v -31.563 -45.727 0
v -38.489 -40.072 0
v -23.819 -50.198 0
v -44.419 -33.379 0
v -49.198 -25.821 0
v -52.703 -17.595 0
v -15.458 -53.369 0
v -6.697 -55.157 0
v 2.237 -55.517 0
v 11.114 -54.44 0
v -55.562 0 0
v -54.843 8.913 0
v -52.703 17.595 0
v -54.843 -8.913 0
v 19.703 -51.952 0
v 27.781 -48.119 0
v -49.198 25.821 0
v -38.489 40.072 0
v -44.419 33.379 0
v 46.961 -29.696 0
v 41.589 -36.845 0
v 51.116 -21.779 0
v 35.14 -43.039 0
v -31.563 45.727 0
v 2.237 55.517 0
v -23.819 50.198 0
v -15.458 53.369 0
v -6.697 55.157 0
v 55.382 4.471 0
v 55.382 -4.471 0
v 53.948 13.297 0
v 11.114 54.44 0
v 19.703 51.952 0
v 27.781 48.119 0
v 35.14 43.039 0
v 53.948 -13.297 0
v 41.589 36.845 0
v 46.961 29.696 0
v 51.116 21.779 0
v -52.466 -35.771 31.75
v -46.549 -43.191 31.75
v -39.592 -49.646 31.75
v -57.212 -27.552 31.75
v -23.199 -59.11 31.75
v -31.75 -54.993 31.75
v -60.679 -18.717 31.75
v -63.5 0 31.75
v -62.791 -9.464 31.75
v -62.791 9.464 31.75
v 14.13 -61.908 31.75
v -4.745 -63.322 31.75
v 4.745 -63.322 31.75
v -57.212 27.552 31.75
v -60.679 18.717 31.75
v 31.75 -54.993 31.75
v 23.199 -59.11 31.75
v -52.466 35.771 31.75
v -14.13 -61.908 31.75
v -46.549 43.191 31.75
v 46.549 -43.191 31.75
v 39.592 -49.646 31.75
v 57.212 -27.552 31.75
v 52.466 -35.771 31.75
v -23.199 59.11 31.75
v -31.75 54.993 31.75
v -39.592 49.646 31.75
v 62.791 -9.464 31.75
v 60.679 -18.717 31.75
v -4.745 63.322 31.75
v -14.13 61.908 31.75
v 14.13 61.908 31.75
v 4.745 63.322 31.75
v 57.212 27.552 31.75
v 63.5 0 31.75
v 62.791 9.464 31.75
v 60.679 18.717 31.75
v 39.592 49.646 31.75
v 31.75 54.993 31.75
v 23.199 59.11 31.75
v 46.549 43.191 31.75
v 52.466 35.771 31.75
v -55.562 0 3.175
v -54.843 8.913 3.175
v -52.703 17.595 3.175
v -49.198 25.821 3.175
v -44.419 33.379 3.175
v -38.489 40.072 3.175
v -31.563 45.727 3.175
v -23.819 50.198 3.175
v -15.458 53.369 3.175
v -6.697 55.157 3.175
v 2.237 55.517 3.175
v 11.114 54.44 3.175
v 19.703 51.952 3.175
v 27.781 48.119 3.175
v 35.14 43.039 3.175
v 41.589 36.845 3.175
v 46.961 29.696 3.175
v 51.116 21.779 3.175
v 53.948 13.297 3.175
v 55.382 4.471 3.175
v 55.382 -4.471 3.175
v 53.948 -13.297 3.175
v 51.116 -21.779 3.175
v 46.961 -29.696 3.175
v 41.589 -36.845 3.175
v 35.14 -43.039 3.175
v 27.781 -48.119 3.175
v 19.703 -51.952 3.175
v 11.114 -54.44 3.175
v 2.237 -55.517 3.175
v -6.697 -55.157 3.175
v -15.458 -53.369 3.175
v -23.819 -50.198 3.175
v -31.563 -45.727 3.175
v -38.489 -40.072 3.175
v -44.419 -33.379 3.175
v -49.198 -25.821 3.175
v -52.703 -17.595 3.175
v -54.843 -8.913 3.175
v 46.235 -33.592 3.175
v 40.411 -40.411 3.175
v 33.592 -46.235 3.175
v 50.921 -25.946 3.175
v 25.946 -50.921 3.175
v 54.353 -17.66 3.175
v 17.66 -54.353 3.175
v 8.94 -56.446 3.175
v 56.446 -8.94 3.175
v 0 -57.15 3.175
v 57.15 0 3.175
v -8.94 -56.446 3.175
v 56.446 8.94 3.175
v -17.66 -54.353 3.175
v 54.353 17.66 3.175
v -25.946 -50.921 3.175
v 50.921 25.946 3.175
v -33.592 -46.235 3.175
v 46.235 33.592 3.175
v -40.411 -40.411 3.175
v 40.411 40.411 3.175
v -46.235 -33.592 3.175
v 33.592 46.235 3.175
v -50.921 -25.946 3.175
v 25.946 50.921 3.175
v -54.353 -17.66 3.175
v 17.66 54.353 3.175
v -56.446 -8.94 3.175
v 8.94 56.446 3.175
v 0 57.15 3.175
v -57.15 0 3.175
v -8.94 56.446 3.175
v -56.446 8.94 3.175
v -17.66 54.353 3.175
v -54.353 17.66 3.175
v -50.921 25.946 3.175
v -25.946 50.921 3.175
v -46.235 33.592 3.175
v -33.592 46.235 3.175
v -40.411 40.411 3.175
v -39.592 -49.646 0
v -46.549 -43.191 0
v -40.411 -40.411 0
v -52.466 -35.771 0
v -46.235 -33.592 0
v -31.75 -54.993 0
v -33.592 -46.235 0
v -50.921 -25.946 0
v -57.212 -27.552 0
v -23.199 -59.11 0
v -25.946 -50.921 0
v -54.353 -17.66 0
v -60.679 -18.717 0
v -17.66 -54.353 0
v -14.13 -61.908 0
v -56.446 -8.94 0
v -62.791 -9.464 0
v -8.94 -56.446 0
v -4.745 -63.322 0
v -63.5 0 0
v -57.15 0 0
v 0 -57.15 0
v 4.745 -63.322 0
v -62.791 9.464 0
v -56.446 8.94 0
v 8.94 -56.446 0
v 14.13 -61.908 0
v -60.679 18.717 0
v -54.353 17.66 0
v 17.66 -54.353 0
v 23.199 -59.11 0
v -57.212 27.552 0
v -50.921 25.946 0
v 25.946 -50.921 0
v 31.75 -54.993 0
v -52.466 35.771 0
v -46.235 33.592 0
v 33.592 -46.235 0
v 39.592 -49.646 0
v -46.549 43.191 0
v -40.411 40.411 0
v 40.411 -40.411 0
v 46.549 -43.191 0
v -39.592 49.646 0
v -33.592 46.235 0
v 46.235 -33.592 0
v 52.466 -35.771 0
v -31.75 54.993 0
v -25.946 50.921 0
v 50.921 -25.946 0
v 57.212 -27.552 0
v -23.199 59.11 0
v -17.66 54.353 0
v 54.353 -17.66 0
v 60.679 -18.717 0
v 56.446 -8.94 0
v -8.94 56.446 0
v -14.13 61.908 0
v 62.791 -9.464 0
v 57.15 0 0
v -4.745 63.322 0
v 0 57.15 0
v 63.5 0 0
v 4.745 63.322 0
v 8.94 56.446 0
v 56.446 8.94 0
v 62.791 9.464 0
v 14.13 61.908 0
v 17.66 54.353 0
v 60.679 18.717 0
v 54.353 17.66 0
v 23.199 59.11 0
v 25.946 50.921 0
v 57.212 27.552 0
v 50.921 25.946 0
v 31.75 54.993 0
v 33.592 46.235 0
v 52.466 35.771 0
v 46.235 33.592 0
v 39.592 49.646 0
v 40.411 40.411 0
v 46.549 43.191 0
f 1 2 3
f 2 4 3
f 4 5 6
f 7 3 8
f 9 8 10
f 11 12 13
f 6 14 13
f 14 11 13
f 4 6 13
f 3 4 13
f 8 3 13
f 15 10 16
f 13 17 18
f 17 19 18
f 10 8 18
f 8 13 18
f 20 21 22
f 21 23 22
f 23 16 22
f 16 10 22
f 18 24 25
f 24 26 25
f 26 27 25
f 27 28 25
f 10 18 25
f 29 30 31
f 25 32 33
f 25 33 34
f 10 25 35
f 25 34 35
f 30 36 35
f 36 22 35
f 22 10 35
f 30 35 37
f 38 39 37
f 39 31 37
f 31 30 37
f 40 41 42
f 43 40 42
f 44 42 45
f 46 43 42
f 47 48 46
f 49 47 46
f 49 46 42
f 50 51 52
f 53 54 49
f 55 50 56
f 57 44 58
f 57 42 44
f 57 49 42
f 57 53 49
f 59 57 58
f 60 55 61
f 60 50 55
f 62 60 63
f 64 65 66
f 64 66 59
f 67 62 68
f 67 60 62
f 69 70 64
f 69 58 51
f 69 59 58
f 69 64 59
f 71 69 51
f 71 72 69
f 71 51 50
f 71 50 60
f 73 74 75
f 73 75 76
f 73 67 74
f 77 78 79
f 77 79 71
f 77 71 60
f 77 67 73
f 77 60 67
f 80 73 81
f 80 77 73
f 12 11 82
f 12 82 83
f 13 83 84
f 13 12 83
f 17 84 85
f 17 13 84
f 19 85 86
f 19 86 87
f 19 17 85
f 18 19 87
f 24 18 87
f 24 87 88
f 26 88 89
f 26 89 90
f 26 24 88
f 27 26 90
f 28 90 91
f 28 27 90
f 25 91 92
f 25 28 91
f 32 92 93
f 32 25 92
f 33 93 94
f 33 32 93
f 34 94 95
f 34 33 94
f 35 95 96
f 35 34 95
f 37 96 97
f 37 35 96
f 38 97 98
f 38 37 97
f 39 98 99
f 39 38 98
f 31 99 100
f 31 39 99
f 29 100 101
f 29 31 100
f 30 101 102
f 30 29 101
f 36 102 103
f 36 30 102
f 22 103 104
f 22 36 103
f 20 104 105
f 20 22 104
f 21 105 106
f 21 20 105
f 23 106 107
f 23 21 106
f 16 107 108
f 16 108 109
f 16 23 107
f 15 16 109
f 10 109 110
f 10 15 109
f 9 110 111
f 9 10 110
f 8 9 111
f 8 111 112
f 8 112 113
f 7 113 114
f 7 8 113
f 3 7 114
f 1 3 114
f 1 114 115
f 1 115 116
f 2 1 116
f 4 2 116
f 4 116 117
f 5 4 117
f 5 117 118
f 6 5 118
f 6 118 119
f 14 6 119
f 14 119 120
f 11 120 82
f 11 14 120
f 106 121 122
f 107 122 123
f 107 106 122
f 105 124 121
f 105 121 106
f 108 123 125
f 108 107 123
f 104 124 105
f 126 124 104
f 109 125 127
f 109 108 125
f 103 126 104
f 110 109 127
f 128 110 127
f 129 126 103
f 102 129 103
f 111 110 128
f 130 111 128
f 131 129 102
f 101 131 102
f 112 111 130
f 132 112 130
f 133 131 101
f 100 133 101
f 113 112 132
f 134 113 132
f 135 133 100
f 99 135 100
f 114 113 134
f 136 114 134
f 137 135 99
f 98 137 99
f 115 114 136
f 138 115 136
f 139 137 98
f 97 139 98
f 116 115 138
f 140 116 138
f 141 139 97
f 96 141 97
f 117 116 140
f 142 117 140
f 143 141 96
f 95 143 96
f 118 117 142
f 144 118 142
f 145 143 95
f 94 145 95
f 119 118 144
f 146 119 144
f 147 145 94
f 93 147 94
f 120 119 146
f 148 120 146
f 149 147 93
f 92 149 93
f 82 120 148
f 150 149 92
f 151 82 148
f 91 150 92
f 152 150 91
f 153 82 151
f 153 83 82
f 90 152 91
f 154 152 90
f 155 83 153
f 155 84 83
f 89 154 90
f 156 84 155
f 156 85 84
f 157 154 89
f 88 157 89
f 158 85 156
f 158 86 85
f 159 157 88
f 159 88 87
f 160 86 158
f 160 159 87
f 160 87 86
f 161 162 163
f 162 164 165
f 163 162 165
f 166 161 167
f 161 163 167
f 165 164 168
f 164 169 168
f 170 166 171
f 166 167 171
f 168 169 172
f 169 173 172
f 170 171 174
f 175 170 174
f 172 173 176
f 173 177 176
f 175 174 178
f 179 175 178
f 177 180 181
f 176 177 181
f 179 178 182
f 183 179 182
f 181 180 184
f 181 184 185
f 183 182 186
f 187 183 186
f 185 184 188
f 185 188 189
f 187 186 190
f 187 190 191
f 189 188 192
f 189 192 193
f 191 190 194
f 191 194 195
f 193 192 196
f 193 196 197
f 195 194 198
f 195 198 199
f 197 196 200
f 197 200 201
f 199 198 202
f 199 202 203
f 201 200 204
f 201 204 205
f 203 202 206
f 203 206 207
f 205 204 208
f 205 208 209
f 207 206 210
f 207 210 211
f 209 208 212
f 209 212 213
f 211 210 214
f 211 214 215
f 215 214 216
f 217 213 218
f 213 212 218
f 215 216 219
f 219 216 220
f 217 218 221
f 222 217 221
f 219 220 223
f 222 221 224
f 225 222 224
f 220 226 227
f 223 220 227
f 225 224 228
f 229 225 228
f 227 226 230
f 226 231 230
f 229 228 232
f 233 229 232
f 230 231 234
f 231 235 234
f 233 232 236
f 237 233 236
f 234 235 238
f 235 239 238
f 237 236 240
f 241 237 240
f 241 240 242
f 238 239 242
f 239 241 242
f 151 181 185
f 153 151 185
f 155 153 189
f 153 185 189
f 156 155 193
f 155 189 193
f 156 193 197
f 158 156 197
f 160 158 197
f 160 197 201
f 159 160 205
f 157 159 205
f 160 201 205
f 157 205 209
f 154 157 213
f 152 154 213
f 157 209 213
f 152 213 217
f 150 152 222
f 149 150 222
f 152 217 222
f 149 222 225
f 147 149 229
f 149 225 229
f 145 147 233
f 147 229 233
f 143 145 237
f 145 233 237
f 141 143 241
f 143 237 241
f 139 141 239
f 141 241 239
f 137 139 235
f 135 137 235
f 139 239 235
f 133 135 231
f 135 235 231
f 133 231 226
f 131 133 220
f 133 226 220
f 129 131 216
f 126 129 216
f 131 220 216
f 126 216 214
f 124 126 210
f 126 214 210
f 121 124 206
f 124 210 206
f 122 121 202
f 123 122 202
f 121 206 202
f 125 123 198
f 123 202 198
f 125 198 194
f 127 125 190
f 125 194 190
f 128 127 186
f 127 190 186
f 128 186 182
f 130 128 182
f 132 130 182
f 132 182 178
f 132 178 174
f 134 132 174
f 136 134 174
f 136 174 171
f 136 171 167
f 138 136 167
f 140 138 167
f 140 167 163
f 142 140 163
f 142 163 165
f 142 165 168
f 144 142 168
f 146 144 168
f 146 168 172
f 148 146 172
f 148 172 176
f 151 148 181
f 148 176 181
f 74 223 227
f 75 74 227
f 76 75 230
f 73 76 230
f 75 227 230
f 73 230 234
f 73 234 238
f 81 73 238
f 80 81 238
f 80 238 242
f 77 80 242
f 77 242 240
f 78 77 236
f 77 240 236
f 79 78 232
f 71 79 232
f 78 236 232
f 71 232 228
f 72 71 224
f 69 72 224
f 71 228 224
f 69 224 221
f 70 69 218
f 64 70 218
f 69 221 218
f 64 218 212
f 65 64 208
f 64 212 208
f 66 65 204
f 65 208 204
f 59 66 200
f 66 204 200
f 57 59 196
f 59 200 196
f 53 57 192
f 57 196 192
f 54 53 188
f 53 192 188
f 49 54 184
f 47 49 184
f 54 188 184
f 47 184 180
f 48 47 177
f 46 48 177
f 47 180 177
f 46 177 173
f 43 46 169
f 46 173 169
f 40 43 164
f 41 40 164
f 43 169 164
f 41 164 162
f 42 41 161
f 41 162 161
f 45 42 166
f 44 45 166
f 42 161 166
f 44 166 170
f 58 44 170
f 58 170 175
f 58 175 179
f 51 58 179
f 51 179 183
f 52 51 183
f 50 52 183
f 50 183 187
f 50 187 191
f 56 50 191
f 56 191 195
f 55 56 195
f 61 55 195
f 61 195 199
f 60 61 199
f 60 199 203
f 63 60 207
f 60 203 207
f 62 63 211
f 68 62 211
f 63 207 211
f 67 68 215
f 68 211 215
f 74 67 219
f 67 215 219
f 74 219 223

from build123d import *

# Parameters (mm, degrees)
SKETCH1_R           = 63.5
BOSS_EXTRUDE1_DEPTH = 31.75
SKETCH2_R           = 57.15
SKETCH2_R_2         = 55.5625
CUT_EXTRUDE1_DEPTH  = 3.175


with BuildPart() as part:
    # Sketch1 → Boss-Extrude1 (new body)
    with BuildSketch(Plane.XY):
        Circle(SKETCH1_R)
    extrude(amount=BOSS_EXTRUDE1_DEPTH)

    # Sketch2 → Cut-Extrude1 (cut)
    with BuildSketch(Plane(origin=(0, 0, 0), x_dir=(-1, 0, 0), z_dir=(0, 0, -1))):
        Circle(SKETCH2_R)
        Circle(SKETCH2_R_2, mode=Mode.SUBTRACT)
    extrude(amount=-CUT_EXTRUDE1_DEPTH, mode=Mode.SUBTRACT)


solid = part.part
